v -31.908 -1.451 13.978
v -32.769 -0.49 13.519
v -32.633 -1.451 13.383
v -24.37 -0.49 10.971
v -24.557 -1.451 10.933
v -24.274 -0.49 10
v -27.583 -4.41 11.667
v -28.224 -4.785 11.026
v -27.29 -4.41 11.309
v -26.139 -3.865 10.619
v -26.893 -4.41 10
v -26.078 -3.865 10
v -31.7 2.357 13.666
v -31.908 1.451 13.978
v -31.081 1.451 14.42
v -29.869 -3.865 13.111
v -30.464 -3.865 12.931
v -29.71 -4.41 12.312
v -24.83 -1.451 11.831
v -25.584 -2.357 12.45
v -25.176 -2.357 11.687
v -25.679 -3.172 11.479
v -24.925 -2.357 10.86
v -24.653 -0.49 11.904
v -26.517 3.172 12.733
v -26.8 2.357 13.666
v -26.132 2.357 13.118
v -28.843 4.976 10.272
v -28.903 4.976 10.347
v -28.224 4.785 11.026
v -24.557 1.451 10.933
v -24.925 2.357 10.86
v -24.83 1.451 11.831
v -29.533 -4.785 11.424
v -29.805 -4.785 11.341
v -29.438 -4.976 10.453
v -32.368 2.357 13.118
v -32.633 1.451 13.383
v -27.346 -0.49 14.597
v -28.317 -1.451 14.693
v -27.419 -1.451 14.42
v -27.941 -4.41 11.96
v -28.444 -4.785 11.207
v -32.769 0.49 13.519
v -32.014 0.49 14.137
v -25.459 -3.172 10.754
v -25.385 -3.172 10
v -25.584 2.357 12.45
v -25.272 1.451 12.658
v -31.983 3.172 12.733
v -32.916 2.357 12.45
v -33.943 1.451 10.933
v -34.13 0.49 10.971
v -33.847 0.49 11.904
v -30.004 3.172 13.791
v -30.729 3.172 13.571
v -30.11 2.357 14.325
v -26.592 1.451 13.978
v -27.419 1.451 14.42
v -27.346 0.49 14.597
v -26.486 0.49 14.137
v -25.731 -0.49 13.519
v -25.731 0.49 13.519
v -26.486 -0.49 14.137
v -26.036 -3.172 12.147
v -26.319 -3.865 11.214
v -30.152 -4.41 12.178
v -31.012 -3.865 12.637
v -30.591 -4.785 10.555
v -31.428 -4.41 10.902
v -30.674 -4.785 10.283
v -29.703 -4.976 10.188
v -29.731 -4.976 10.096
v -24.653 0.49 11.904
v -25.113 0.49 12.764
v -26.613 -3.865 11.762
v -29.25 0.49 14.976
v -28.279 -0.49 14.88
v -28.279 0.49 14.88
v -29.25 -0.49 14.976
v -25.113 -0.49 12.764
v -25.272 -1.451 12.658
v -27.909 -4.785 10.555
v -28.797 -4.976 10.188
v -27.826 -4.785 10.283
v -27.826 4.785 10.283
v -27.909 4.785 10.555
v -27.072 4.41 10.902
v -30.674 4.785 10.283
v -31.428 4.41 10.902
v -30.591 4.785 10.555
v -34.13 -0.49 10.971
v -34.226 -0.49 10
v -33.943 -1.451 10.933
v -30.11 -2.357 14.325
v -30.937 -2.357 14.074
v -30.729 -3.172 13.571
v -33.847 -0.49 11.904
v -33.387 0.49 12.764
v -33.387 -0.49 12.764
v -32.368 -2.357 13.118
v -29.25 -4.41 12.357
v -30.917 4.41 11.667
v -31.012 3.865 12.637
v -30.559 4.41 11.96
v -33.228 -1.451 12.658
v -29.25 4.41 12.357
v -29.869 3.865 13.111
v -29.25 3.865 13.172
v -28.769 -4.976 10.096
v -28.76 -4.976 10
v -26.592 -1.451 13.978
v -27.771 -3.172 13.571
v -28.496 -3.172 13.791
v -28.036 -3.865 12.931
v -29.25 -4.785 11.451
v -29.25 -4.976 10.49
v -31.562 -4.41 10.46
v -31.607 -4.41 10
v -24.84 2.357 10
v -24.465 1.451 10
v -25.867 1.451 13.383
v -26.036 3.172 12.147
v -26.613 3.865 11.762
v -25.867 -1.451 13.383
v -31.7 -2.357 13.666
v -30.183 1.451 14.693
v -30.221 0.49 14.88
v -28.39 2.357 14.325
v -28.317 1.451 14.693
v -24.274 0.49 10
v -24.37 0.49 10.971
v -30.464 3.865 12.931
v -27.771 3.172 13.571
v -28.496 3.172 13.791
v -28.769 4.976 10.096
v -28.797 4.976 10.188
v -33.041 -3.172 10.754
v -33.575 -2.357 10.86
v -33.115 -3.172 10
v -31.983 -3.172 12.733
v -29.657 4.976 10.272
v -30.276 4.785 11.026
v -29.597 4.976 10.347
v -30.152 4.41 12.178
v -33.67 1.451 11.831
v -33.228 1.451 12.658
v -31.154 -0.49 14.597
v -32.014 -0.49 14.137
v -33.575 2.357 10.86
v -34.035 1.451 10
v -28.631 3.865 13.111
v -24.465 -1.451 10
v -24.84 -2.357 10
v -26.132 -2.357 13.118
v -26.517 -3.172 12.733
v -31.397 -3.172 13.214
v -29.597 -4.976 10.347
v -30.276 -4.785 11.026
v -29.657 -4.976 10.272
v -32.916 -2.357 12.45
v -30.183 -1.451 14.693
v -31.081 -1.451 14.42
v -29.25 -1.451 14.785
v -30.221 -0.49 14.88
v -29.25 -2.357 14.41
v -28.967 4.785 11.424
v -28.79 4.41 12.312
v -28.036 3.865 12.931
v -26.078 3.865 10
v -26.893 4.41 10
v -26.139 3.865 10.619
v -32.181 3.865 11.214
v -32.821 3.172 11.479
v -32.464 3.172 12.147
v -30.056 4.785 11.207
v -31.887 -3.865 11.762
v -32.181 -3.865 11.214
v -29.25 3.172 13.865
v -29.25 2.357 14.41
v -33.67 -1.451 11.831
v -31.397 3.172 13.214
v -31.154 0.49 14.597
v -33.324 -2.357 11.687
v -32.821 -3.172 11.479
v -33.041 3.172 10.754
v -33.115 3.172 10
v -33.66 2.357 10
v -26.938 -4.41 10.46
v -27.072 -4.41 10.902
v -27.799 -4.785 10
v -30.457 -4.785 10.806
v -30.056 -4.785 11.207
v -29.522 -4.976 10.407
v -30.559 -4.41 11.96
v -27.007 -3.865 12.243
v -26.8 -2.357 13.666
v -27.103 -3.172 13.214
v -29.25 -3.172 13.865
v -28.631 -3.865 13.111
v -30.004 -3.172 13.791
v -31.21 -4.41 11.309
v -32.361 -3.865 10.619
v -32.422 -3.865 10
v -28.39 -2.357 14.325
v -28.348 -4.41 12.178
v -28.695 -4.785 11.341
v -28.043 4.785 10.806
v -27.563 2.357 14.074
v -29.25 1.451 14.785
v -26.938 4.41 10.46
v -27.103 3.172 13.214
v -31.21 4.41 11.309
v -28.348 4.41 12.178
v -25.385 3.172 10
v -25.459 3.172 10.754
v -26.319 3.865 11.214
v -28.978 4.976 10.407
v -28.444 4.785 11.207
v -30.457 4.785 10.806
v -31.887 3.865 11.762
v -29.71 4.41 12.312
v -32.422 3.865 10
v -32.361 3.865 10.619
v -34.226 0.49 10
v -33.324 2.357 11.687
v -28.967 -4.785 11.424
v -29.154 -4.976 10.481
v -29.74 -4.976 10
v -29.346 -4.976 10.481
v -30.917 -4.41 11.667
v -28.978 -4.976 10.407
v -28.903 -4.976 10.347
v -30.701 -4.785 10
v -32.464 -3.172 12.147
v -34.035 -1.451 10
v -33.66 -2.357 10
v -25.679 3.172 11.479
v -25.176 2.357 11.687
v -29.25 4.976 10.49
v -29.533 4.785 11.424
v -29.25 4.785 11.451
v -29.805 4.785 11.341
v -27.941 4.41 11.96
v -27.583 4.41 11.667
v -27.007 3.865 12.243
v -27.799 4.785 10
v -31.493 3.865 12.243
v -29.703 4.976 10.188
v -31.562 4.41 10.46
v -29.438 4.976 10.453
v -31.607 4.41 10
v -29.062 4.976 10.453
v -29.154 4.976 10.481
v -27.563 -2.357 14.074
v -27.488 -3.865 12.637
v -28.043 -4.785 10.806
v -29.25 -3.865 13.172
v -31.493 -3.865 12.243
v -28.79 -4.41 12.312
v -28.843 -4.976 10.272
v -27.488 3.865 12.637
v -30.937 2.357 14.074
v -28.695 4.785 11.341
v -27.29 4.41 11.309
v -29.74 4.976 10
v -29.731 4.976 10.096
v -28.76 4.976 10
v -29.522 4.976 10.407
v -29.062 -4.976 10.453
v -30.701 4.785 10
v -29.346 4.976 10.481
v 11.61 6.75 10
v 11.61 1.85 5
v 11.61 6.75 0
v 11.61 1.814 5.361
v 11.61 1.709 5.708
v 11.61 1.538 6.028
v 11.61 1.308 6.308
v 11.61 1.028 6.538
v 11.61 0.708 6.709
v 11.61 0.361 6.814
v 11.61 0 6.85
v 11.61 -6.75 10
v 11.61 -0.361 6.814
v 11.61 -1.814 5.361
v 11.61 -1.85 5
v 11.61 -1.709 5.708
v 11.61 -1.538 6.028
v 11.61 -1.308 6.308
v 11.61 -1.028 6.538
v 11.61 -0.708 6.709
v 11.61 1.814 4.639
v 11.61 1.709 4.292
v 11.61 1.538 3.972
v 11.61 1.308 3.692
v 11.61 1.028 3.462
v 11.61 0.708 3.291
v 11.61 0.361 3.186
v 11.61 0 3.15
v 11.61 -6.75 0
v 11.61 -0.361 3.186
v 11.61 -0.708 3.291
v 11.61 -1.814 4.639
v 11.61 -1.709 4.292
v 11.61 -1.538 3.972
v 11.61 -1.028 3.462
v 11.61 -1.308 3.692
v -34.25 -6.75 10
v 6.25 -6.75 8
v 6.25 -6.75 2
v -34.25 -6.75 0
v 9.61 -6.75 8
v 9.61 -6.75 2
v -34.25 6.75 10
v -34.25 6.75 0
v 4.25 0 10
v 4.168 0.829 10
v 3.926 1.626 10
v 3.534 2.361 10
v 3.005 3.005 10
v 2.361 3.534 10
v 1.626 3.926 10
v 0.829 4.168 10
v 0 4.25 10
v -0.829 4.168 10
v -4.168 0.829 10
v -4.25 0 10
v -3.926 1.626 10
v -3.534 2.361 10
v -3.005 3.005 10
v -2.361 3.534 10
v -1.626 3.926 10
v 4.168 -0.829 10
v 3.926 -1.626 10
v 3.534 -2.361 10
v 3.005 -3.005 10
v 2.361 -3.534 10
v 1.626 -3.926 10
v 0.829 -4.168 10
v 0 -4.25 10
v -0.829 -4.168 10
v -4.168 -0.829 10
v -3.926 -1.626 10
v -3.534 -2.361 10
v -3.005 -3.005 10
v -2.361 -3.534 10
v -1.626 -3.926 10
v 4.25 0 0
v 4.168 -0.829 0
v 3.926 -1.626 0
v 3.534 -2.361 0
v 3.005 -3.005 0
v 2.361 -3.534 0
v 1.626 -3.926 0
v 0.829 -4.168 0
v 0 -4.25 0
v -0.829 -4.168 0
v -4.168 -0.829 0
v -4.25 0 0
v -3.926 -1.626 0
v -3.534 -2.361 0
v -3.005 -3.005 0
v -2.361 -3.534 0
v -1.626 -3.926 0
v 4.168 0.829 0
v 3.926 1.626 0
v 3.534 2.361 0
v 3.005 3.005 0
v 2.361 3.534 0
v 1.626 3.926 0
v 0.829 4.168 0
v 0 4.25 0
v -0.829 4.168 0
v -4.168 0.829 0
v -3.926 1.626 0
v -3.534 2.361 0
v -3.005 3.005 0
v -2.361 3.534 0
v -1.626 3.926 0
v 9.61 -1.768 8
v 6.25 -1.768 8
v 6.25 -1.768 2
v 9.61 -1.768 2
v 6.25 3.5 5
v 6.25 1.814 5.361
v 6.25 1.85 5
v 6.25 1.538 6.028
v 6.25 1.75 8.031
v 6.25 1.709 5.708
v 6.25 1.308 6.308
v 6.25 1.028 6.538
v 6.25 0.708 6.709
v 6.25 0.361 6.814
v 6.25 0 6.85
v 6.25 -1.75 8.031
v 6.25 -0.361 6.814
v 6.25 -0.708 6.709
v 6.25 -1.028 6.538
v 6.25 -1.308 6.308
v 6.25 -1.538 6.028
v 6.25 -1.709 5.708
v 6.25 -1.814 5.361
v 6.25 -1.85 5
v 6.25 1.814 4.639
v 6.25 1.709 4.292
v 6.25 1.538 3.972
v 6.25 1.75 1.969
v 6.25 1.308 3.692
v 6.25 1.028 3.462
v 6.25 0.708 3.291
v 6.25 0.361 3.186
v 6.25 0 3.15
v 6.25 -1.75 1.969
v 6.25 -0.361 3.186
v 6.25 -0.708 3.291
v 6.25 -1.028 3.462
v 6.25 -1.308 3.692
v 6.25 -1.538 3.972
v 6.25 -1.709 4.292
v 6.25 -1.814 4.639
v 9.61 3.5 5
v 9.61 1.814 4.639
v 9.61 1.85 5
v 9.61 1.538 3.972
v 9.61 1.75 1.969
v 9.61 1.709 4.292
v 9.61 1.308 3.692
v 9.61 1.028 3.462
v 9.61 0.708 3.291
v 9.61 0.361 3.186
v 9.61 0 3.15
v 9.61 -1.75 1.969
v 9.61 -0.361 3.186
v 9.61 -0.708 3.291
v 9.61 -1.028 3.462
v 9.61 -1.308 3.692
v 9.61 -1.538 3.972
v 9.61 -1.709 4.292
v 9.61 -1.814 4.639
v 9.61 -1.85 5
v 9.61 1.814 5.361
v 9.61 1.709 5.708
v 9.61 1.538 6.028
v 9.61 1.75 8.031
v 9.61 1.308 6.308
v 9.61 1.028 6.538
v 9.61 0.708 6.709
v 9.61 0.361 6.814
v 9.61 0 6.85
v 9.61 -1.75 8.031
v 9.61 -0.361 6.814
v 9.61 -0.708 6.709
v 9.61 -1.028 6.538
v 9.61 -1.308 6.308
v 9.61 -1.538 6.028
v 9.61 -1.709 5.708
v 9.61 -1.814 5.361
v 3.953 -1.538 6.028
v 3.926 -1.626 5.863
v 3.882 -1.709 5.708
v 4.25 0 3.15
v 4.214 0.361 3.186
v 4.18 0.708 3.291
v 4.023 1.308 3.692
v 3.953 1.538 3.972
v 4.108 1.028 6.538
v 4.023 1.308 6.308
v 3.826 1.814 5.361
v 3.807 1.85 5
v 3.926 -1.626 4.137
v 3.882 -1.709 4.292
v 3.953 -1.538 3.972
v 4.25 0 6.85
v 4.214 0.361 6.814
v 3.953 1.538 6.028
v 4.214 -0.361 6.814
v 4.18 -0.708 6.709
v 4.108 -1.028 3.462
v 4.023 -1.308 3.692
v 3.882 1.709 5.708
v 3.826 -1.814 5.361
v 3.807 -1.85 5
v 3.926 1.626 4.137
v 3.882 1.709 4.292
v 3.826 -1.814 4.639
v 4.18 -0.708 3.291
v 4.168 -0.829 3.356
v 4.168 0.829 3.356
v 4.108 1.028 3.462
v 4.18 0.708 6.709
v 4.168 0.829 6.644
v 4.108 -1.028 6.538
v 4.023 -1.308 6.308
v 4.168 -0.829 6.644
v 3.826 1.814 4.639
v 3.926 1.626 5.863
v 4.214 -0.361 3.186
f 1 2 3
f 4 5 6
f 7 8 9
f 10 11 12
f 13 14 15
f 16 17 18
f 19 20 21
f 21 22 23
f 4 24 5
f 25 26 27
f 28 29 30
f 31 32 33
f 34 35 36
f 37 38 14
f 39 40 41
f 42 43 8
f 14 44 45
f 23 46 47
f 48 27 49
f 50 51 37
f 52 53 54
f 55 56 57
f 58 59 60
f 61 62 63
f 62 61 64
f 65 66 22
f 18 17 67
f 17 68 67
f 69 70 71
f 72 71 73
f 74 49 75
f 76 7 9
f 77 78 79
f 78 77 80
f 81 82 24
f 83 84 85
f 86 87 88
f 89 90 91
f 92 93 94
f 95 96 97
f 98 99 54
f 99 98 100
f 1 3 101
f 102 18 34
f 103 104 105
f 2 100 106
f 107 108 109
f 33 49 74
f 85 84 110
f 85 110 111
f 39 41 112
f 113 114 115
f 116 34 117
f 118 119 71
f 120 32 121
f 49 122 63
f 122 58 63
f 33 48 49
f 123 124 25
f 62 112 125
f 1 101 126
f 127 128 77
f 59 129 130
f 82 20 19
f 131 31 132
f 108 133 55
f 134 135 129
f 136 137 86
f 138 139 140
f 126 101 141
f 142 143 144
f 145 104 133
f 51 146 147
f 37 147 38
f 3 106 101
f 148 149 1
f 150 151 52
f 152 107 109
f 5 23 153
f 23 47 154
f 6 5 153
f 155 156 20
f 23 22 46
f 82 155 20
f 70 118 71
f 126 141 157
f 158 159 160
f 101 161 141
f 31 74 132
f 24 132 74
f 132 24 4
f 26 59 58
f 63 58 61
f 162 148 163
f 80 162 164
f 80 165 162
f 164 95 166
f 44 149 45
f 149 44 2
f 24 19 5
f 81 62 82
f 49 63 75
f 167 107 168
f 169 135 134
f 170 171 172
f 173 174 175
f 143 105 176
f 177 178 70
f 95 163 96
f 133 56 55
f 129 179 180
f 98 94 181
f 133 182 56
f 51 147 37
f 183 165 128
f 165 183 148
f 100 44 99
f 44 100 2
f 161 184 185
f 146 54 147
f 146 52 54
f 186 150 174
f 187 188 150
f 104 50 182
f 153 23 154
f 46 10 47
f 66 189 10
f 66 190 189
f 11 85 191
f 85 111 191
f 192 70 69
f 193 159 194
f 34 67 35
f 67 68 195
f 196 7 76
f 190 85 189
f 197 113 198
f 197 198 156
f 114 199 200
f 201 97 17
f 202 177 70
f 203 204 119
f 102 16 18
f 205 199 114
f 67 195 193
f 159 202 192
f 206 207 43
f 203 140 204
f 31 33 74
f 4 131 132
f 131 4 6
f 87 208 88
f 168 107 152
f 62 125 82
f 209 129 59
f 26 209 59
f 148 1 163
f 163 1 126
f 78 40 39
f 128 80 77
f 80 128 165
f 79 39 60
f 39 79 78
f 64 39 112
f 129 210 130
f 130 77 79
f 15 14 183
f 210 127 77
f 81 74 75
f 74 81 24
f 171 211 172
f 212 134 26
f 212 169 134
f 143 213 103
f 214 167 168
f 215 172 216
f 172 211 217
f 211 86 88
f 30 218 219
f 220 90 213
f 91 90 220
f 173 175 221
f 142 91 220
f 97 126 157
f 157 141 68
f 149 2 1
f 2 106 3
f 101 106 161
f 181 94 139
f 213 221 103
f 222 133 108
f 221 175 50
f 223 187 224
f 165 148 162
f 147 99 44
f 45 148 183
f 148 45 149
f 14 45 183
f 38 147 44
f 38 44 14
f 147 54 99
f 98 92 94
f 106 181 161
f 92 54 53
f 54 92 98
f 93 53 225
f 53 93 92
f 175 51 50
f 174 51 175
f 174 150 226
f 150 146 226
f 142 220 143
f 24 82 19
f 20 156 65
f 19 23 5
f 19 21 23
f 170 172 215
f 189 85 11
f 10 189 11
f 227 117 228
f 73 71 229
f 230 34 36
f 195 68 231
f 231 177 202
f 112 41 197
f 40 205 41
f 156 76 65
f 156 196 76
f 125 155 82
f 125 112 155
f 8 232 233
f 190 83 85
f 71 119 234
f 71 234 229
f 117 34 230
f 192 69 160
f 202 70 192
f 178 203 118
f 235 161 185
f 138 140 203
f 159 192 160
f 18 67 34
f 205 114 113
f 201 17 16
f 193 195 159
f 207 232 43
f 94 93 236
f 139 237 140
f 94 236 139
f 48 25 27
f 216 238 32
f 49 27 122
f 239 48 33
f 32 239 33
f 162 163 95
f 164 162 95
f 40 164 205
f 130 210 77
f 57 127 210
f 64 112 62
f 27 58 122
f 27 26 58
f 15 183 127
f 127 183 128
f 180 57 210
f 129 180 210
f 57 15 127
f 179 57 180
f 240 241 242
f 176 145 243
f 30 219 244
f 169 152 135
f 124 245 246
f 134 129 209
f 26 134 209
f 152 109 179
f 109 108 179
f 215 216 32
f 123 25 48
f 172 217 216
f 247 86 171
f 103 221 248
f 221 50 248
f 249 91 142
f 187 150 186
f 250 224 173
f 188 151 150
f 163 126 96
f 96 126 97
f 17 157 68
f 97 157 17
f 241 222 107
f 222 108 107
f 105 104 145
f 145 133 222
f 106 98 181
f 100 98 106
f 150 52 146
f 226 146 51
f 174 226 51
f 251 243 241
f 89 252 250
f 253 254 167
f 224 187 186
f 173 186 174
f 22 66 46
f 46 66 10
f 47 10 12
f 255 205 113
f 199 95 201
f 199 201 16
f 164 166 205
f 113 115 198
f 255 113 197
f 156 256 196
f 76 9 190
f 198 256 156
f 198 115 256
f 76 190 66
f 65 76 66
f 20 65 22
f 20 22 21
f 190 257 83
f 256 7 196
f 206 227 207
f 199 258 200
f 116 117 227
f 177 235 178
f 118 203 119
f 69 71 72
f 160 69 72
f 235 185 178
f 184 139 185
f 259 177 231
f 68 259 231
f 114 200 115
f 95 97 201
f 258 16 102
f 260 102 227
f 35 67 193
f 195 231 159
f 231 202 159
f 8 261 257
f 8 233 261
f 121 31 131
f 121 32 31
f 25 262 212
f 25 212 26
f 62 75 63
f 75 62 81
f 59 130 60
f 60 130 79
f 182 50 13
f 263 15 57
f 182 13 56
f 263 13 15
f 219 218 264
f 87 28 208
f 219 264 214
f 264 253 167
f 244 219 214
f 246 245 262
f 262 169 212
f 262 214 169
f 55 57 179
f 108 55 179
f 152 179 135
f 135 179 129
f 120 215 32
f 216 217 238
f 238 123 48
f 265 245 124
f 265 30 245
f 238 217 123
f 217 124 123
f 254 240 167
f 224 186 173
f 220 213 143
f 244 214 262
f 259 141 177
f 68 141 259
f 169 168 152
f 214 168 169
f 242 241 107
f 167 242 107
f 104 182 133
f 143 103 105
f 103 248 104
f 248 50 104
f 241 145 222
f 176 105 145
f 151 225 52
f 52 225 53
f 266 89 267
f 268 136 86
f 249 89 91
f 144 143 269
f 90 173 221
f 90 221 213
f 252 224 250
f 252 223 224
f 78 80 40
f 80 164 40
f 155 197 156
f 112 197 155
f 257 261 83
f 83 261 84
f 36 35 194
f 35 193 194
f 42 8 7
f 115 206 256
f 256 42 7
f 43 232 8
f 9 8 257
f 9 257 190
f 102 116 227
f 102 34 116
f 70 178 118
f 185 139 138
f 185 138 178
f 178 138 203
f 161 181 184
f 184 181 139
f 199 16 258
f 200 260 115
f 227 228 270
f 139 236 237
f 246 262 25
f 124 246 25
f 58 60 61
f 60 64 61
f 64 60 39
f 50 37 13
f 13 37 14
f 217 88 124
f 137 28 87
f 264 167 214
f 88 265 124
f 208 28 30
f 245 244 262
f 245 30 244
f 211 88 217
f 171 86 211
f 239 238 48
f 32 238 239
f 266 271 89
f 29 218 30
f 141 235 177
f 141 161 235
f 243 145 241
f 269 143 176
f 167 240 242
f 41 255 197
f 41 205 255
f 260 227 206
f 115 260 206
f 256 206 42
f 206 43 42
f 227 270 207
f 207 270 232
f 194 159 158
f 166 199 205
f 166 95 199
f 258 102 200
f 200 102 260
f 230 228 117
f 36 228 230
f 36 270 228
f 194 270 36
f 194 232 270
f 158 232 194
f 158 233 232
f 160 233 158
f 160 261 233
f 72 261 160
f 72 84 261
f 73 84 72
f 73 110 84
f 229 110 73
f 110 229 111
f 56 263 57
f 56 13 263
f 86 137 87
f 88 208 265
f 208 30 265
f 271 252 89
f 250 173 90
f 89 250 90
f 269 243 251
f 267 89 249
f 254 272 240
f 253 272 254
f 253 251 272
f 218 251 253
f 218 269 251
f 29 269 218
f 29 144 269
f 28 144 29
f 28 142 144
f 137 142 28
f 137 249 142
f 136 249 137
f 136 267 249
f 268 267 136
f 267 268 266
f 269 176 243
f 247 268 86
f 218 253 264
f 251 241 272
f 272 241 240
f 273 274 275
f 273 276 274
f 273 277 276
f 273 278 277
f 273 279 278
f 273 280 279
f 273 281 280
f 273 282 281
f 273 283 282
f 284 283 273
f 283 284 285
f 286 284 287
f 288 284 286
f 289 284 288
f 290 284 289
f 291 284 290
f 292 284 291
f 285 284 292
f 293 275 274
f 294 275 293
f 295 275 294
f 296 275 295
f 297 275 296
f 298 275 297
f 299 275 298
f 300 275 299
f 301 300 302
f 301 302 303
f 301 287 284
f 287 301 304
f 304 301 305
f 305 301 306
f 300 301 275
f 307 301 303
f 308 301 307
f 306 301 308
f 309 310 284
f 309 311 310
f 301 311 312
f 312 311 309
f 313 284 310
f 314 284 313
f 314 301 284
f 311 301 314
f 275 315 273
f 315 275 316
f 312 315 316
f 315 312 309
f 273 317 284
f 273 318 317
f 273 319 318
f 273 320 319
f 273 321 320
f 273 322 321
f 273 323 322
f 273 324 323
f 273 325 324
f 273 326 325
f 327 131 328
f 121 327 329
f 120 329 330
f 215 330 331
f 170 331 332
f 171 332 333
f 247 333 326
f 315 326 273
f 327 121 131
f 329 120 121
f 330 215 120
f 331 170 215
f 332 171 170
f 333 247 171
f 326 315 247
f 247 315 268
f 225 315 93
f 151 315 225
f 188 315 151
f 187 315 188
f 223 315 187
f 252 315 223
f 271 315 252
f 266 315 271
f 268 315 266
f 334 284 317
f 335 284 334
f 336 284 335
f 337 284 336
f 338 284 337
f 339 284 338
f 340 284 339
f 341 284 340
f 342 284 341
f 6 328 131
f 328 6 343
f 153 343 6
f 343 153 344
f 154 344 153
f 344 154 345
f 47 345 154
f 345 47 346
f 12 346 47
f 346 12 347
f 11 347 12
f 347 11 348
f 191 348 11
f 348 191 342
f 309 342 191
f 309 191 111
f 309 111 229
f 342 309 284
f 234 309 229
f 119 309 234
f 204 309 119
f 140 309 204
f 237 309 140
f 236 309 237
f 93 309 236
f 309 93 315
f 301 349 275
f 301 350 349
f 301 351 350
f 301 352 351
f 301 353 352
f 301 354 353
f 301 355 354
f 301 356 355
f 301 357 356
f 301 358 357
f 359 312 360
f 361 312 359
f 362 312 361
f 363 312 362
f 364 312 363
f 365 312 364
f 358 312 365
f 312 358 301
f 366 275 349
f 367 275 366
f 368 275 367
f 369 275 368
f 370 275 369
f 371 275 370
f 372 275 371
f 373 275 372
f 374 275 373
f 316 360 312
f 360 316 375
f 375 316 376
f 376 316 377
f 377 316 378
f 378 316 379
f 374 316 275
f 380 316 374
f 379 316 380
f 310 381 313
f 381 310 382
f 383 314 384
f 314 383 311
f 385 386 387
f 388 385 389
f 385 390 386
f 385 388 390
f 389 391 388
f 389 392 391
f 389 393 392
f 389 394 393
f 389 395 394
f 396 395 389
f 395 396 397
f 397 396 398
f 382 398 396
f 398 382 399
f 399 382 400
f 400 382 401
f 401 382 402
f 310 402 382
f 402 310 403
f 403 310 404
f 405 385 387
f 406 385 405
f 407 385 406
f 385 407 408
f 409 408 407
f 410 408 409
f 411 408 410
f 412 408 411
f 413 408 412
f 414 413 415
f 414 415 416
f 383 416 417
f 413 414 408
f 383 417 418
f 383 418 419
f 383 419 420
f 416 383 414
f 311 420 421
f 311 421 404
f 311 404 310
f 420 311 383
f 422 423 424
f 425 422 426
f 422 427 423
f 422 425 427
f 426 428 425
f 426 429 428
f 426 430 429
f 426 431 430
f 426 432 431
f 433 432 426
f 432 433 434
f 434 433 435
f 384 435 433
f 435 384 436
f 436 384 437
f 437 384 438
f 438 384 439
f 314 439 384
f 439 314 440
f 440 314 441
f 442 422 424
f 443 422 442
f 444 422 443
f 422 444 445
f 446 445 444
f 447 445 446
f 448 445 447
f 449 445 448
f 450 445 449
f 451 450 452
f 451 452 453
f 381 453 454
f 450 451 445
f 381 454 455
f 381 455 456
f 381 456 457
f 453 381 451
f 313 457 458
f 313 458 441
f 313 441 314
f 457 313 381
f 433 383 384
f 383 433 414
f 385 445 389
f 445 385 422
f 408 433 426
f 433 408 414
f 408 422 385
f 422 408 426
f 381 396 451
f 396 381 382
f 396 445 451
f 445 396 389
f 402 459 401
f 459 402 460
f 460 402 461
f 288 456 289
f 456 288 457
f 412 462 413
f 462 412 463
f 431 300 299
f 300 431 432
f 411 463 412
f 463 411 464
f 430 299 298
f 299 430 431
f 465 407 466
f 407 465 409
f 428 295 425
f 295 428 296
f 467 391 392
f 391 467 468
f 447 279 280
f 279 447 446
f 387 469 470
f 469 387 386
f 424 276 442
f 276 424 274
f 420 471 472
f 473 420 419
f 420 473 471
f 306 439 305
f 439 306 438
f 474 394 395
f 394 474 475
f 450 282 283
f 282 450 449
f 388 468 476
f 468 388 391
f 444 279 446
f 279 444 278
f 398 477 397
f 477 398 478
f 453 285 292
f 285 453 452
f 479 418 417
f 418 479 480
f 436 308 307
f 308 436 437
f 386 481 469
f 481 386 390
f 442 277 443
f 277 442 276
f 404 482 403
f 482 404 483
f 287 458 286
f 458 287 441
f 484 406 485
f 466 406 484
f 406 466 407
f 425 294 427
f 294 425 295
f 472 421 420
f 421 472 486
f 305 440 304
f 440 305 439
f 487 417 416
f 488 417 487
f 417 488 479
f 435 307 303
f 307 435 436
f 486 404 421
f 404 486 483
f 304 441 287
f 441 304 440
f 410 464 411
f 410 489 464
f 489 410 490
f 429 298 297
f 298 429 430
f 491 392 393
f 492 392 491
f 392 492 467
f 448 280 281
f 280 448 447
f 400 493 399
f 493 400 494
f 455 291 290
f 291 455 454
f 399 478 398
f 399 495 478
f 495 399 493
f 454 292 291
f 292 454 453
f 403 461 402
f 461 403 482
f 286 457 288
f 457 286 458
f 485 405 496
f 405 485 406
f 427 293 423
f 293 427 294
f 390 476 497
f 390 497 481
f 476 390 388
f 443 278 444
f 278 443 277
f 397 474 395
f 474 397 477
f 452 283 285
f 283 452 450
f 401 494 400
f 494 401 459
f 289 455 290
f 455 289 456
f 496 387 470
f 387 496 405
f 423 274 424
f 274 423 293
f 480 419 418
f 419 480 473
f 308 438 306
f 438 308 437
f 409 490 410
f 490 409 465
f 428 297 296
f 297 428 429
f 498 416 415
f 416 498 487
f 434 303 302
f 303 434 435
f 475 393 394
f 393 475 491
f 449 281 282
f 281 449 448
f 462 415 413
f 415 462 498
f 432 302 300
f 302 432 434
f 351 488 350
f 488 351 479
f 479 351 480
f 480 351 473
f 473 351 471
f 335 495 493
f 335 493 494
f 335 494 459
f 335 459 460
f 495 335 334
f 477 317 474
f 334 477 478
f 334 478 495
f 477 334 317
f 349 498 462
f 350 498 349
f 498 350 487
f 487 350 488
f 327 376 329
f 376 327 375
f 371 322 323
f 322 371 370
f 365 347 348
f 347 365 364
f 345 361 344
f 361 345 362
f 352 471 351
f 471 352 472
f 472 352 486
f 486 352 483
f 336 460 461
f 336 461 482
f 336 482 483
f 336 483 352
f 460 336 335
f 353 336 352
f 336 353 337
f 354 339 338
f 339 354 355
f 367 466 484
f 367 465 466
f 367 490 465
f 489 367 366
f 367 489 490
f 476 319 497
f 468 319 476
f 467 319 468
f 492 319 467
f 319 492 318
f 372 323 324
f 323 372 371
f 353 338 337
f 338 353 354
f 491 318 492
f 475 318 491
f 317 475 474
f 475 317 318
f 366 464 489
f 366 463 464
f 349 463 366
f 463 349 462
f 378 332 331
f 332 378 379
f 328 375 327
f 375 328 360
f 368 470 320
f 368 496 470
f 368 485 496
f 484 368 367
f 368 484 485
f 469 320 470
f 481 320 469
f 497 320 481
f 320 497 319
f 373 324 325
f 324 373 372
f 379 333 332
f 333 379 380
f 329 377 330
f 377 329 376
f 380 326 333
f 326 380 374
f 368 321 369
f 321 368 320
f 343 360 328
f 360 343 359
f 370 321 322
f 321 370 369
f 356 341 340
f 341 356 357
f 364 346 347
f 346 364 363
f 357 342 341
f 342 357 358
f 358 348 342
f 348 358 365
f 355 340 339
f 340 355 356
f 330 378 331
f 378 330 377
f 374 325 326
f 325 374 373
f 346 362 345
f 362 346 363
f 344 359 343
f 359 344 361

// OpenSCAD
// NOTE - spring design could be better...


//CUSTOMIZER VARIABLES

/* [Basic_Parameters] */

// First rod diameter, in mm
rod_diameter = 8.0;  // [2.0:0.1:40]

// Holder length, in mm
holder_length = 30; // [1:1:100];

// Contact Style
contact_style = 0;   // [0:Hemisphere, 1:SpringPlate, 2:Point, 3:Cylinder]

// Contact length, in mm
contact_length = 5; // [1:40]

// Spring thickness, in mm
spring_thickness = 1;   // [0.5:0.1:4.0]

// Bolt diameter, in mm
bolt_diameter = 3.0;    // [2:0.1:20]

// Nut diameter, in mm
nut_diameter = 6.0;  // [3:0.1:40]

// Nut thickness, in mm
nut_thickness = 2.8;  // [1.0:0.1:30]


/* [Extra_Features_for_Strength] */

// Margin to support the rods, in mm
rod_margin = 5; // [2:30]

// Nut clamp width margin, in mm
nut_clamp_margin = 4;   // [2:30]

//CUSTOMIZER VARIABLES END


// Sanity checks
if( rod_diameter <= 0
    || bolt_diameter <= 0 || nut_diameter <= 0 || nut_thickness <= 0)
{
    echo("<B>Error: Missing important parameters</B>");
}

if(nut_diameter <= bolt_diameter)
{
    echo("<B>Error: Nut size too small for bolt</B>");
}

// how much extra space to allow in nut trap, not user settable
nut_space_factor = 1.20;

nut_trap_len = nut_thickness*nut_space_factor;

bolt_rad = (bolt_diameter+0.7)/2;  // this should be almost loose
rod_rad = (rod_diameter+0.5)/2;  // should be sorta tight

z_rod_diameter = (rod_rad*2);
z_nut_size = 0;

// x length
main_width = max( 10, (rod_rad*2) + max( rod_margin/2, holder_length ) + nut_trap_len + nut_clamp_margin );
// z length
main_depth= max( 10, max(z_rod_diameter+rod_margin,z_nut_size), (bolt_rad*2)+nut_clamp_margin, contact_length*2 );
// y length
main_height = max( 10, nut_diameter + nut_clamp_margin, (bolt_rad*2)+nut_clamp_margin );




rotationZero = [0,0,0];
rotation90 = [90,0,0];
final_rotation = (contact_style == 1) ? rotationZero: rotation90;

translationZ = [0,0,main_depth/2];
translationY = [0,0,main_height/2];
final_translation = (contact_style == 1) ? translationZ: translationY;

// our object, translated to be flat on xy plane for easy STL generation
translate(final_translation) rotate(final_rotation)
    component_holder();


module hexagon(height,radius) 
{
  linear_extrude(height)
    circle(radius,$fn=6);
}

module nuttrap(){
  trap_depth = max( main_depth, main_height );
  translate([0,-nut_trap_len/2,trap_depth/2])
    cube([nut_diameter,nut_trap_len,trap_depth],center=true);
  rotate([90,360/12,0]) // so point is down, nut trapped by straight sides
    hexagon(nut_trap_len,(nut_diameter+1)/2);
}


module component_holder() {

    rod_x = 0;
    
    nut_x = rod_x + rod_rad + (nut_clamp_margin/2);
    nut_y = 0;

    rod_length = max(main_height,main_depth) + 20;

    difference() {

       union() {
          // the main block
          testx = -main_width/2 + rod_rad + nut_trap_len + nut_clamp_margin;
          translate([testx,0,0])
            cube([main_width,main_height,main_depth],center = true);
          
          if (contact_style == 1) {
             // spring plate: best in ABS or PETG, maybe SLA Flexible/Firm?
             plate_len = main_width - (rod_rad*2 + rod_margin/2 + nut_trap_len + nut_clamp_margin);
             
             platex = -main_width + (rod_rad + nut_trap_len + nut_clamp_margin) + plate_len/2;
             translate([platex,main_height/2 + contact_length + spring_thickness/2,0])
               cube([plate_len,spring_thickness,main_depth],center = true);
            
             spring_len = contact_length * 1.4142 + spring_thickness + 0.2;
             spring_offset = plate_len / 4;
             springy = main_height/2 + contact_length/2;
             translate([platex-spring_offset,springy,0])
               rotate([0,0,-45])
                 cube([spring_len,spring_thickness,main_depth],center = true);
             translate([platex+spring_offset,springy,0])
               rotate([0,0,-45])
                 cube([spring_len,spring_thickness,main_depth],center = true);
          } else {
            pointx = -main_width + (rod_rad + nut_trap_len + nut_clamp_margin) + contact_length;
            translate([pointx,main_height/2,0]) {
                if (contact_style == 0) {
                    difference() {
                        sphere(contact_length, $fn=32);
                        translate([0,-(main_height/2)-(contact_length+2)/2,0])
                          cube([main_width,contact_length+2,main_depth+2],center = true);
                    }
                } else if (contact_style == 2) {
                    rotate([-90,0,0])
                    cylinder(contact_length,contact_length,0,$fn=32);
                } else if (contact_style == 3) {
                    rotate([-90,0,0])
                    cylinder(contact_length,contact_length,contact_length,$fn=32);
                }
             }
          }
       
       }    // end union


      // rod clamp nut and bolt hole
      translate([nut_x,nut_y,0])
        rotate([0,0,90])
          nuttrap();
      translate([rod_x,nut_y,0])
        rotate([0,90,0])
          cylinder(main_width,bolt_rad,bolt_rad,$fn=32);

      // the rod
    #color("green")
      translate([rod_x,0,0])
        rotate([90,0,0])
          cylinder(rod_length,rod_rad,rod_rad,center=true,$fn=32);

    }
}
